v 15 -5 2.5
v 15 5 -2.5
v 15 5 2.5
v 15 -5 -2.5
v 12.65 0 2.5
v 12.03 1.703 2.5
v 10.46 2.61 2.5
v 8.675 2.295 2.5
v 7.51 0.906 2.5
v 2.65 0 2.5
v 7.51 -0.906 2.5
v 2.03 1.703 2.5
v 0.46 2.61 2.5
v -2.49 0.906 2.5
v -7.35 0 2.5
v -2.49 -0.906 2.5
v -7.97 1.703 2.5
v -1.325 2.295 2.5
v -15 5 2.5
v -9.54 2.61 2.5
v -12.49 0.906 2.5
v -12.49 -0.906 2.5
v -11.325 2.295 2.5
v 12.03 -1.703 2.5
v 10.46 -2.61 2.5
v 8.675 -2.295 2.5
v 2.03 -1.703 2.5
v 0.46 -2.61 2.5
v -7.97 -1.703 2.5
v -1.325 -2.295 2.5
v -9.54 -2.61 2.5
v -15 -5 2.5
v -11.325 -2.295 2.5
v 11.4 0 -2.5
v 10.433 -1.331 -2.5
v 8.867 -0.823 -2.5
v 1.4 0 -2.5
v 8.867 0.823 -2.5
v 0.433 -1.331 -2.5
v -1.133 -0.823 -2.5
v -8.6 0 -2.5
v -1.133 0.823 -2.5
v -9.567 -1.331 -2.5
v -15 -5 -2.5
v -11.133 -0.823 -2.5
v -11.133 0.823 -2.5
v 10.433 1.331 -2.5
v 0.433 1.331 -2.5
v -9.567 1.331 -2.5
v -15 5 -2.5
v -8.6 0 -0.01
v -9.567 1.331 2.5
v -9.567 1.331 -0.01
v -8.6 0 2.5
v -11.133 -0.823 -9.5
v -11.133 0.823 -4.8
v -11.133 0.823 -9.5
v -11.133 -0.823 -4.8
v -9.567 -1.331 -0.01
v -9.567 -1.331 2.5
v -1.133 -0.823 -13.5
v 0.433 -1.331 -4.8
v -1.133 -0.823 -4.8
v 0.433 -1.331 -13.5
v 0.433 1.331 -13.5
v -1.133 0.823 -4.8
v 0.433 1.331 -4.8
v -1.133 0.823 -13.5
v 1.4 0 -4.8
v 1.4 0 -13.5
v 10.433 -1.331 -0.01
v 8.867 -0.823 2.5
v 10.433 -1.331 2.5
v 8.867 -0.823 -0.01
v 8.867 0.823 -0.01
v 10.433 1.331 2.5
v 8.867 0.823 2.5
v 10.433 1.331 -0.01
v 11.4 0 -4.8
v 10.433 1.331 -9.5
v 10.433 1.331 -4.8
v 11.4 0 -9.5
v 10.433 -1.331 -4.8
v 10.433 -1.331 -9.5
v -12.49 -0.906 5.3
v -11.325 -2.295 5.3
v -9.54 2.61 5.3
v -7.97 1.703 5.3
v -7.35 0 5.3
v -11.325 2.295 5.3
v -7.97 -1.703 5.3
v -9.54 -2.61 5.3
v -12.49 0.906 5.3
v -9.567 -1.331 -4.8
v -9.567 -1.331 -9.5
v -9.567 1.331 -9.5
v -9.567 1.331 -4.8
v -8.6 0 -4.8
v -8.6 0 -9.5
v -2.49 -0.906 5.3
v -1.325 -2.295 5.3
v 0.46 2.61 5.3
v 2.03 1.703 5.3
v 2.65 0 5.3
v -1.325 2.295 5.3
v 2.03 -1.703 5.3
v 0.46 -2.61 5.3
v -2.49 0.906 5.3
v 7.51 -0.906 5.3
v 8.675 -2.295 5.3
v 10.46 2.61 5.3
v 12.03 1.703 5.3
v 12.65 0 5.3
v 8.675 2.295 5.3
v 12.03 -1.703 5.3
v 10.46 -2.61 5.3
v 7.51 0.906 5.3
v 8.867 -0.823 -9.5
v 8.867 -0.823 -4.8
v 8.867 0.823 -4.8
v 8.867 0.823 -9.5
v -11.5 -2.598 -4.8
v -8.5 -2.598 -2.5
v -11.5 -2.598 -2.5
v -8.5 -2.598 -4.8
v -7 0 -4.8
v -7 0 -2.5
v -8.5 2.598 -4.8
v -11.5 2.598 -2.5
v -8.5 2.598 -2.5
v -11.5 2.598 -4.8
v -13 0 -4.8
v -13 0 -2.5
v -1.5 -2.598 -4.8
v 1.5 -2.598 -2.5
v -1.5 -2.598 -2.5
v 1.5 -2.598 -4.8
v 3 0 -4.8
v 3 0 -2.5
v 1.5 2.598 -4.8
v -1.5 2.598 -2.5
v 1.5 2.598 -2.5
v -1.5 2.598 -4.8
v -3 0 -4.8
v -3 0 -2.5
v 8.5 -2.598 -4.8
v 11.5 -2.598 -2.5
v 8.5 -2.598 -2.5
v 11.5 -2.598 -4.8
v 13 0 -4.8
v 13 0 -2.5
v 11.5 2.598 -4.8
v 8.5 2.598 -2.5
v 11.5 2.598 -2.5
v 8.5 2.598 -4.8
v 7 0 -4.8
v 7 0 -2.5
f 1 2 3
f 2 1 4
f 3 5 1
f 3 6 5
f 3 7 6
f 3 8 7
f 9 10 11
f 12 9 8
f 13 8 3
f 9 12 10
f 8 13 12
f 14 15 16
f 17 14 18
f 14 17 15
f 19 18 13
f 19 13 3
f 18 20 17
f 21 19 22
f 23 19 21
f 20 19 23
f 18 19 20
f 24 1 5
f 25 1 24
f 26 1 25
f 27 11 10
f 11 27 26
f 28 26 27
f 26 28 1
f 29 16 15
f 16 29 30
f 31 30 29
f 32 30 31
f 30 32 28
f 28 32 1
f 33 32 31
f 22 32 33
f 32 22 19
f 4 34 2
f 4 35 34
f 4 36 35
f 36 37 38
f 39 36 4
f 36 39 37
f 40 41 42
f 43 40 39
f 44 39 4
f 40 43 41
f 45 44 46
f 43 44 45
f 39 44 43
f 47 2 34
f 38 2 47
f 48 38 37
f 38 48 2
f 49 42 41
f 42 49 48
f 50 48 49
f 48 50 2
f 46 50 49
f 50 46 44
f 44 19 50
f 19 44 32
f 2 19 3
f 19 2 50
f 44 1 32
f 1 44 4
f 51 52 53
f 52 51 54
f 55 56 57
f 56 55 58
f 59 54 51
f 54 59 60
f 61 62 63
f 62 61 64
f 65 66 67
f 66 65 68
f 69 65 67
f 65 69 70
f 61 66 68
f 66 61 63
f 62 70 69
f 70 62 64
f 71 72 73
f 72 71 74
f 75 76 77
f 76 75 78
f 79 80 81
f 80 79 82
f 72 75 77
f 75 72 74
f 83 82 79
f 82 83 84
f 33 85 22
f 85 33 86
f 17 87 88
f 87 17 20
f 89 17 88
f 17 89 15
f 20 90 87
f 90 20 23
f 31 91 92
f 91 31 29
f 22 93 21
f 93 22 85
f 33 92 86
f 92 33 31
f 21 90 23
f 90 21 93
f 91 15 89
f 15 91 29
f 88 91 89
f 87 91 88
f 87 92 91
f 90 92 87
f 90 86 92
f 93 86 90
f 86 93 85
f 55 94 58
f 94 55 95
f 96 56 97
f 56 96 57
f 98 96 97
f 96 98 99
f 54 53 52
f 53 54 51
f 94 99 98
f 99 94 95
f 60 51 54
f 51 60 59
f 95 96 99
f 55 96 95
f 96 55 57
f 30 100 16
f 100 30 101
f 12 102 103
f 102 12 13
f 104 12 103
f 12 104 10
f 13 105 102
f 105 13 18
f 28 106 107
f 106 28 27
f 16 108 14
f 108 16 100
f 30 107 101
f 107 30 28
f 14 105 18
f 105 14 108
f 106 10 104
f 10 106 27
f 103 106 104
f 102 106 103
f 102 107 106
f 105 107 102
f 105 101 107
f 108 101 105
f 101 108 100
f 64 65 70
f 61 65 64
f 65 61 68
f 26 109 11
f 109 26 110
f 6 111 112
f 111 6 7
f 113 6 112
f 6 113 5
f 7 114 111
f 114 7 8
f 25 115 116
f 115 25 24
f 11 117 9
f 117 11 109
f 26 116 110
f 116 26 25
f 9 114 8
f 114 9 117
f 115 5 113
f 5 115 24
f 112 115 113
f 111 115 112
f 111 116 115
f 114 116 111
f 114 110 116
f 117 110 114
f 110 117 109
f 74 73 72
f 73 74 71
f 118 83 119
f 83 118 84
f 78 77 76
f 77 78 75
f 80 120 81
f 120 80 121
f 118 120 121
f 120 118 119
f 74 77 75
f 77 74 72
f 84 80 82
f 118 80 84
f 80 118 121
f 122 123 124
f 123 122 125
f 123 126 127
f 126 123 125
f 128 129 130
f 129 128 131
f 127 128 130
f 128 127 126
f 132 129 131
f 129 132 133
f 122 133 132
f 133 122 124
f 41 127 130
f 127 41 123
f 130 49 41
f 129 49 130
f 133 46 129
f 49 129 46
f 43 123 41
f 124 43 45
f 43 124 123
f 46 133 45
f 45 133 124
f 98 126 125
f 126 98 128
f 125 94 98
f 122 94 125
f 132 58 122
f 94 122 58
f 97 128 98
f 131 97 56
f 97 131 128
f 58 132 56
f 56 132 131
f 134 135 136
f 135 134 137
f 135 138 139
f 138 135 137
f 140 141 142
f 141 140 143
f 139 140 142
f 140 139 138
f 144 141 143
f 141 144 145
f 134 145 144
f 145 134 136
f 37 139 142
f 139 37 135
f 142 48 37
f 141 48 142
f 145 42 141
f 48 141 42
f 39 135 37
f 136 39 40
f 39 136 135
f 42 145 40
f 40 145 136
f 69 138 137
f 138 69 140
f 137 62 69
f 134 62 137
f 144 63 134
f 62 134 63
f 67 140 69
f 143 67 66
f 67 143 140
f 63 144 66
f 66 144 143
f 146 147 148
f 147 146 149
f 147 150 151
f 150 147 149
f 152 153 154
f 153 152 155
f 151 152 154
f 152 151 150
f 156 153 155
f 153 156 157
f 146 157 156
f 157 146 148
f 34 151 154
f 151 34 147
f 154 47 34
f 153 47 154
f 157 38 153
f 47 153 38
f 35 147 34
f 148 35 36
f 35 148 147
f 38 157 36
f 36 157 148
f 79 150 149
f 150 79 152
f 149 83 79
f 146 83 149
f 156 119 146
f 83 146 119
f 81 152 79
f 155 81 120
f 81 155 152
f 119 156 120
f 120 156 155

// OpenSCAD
union() {
	difference() {
		cube(center = true, size = [30, 10, 5]);
		translate(v = [-10, 0, 0]) {
			translate(v = [0, 0, -0.0100000000]) {
				cylinder(h = 5.0200000000, r = 1.4000000000);
			}
		}
		translate(v = [0, 0, -0.0100000000]) {
			cylinder(h = 5.0200000000, r = 1.4000000000);
		}
		translate(v = [10, 0, 0]) {
			translate(v = [0, 0, -0.0100000000]) {
				cylinder(h = 5.0200000000, r = 1.4000000000);
			}
		}
	}
	translate(v = [-10, 0, 2.5000000000]) {
		union() {
			cylinder(h = 2.8000000000, r = 2.6500000000);
			translate(v = [0, 0, -12]) {
				cylinder(h = 12, r = 1.4000000000);
			}
		}
	}
	translate(v = [0, 0, 2.5000000000]) {
		union() {
			cylinder(h = 2.8000000000, r = 2.6500000000);
			translate(v = [0, 0, -16]) {
				cylinder(h = 16, r = 1.4000000000);
			}
		}
	}
	translate(v = [10, 0, 2.5000000000]) {
		union() {
			cylinder(h = 2.8000000000, r = 2.6500000000);
			translate(v = [0, 0, -12]) {
				cylinder(h = 12, r = 1.4000000000);
			}
		}
	}
	translate(v = [-10, 0, -4.8000000000]) {
		difference() {
			cylinder($fn = 6, h = 2.3000000000, r = 3);
			translate(v = [0, 0, -0.0100000000]) {
				cylinder(h = 2.3200000000, r = 1.4000000000);
			}
		}
	}
	translate(v = [0, 0, -4.8000000000]) {
		difference() {
			cylinder($fn = 6, h = 2.3000000000, r = 3);
			translate(v = [0, 0, -0.0100000000]) {
				cylinder(h = 2.3200000000, r = 1.4000000000);
			}
		}
	}
	translate(v = [10, 0, -4.8000000000]) {
		difference() {
			cylinder($fn = 6, h = 2.3000000000, r = 3);
			translate(v = [0, 0, -0.0100000000]) {
				cylinder(h = 2.3200000000, r = 1.4000000000);
			}
		}
	}
}
/***********************************************
*********      SolidPython code:      **********
************************************************
 
#! /usr/bin/env python
# -*- coding: utf-8 -*-

# Basic shape with several repeated parts, demonstrating the use of
# solid.utils.bill_of_materials()
#
# Basically:
#   -- Define every part you want in the Bill of Materials in a function
#   -- Use the 'bom_part' decorator ahead of the definition of each part's function
#           e.g.:
# @bom_part()
# def my_part():
#     pass
#   -- Optionally, you can add a description and a per-unit cost to the
#       decorator invocations.
#
#   -- To generate the bill of materials, call solid.utils.bill_of_materials()
#
#       -ETJ 08 Mar 2011

import os
import sys

from solid import *
from solid.utils import *

head_rad = 2.65
head_height = 2.8

nut_height = 2.3
nut_rad = 3

m3_rad = 1.4

doohickey_h = 5

set_bom_headers("link", "leftover")

def head():
    return cylinder(h=head_height, r=head_rad)


@bom_part("M3x16 Bolt", 0.12, currency="€", link="http://example.io/M3x16", leftover=0)
def m3_16(a=3):
    bolt_height = 16
    m = union()(
        head(),
        translate([0, 0, -bolt_height])(
            cylinder(r=m3_rad, h=bolt_height)
        )
    )
    return m


@bom_part("M3x12 Bolt", 0.09, leftover=0)
def m3_12():
    bolt_height = 12
    m = union()(
        head(),
        translate([0, 0, -bolt_height])(
            cylinder(r=m3_rad, h=bolt_height)
        )
    )
    return m


@bom_part("M3 Nut", 0.04, currency="R$")
def m3_nut():
    hx = cylinder(r=nut_rad, h=nut_height)
    hx.add_param('$fn', 6)  # make the nut hexagonal
    n = difference()(
        hx,
        translate([0, 0, -EPSILON])(
            cylinder(r=m3_rad, h=nut_height + 2 * EPSILON)
        )
    )
    return n


@bom_part()
def doohickey():
    hole_cyl = translate([0, 0, -EPSILON])(
        cylinder(r=m3_rad, h=doohickey_h + 2 * EPSILON)
    )
    d = difference()(
        cube([30, 10, doohickey_h], center=True),
        translate([-10, 0, 0])(hole_cyl),
        hole_cyl,
        translate([10, 0, 0])(hole_cyl)
    )
    return d


def assemble():
    return union()(
        doohickey(),
        translate([-10, 0, doohickey_h / 2])(m3_12()),
        translate([  0, 0, doohickey_h / 2])(m3_16()),
        translate([ 10, 0, doohickey_h / 2])(m3_12()),
        # Nuts
        translate([-10, 0, -nut_height - doohickey_h / 2])(m3_nut()),
        translate([  0, 0, -nut_height - doohickey_h / 2])(m3_nut()),
        translate([ 10, 0, -nut_height - doohickey_h / 2])(m3_nut()),
    )

if __name__ == '__main__':
    out_dir = sys.argv[1] if len(sys.argv) > 1 else os.curdir
    file_out = os.path.join(out_dir, 'BOM_example.scad')

    a = assemble()

    bom = bill_of_materials()

    print("%(__file__)s: SCAD file written to: \n%(file_out)s" % vars())
    print(bom)

    print("Or, Spreadsheet-ready TSV:\n\n")
    bom = bill_of_materials(csv=True)
    print(bom)


    scad_render_to_file(a, file_out)
 
 
************************************************/
